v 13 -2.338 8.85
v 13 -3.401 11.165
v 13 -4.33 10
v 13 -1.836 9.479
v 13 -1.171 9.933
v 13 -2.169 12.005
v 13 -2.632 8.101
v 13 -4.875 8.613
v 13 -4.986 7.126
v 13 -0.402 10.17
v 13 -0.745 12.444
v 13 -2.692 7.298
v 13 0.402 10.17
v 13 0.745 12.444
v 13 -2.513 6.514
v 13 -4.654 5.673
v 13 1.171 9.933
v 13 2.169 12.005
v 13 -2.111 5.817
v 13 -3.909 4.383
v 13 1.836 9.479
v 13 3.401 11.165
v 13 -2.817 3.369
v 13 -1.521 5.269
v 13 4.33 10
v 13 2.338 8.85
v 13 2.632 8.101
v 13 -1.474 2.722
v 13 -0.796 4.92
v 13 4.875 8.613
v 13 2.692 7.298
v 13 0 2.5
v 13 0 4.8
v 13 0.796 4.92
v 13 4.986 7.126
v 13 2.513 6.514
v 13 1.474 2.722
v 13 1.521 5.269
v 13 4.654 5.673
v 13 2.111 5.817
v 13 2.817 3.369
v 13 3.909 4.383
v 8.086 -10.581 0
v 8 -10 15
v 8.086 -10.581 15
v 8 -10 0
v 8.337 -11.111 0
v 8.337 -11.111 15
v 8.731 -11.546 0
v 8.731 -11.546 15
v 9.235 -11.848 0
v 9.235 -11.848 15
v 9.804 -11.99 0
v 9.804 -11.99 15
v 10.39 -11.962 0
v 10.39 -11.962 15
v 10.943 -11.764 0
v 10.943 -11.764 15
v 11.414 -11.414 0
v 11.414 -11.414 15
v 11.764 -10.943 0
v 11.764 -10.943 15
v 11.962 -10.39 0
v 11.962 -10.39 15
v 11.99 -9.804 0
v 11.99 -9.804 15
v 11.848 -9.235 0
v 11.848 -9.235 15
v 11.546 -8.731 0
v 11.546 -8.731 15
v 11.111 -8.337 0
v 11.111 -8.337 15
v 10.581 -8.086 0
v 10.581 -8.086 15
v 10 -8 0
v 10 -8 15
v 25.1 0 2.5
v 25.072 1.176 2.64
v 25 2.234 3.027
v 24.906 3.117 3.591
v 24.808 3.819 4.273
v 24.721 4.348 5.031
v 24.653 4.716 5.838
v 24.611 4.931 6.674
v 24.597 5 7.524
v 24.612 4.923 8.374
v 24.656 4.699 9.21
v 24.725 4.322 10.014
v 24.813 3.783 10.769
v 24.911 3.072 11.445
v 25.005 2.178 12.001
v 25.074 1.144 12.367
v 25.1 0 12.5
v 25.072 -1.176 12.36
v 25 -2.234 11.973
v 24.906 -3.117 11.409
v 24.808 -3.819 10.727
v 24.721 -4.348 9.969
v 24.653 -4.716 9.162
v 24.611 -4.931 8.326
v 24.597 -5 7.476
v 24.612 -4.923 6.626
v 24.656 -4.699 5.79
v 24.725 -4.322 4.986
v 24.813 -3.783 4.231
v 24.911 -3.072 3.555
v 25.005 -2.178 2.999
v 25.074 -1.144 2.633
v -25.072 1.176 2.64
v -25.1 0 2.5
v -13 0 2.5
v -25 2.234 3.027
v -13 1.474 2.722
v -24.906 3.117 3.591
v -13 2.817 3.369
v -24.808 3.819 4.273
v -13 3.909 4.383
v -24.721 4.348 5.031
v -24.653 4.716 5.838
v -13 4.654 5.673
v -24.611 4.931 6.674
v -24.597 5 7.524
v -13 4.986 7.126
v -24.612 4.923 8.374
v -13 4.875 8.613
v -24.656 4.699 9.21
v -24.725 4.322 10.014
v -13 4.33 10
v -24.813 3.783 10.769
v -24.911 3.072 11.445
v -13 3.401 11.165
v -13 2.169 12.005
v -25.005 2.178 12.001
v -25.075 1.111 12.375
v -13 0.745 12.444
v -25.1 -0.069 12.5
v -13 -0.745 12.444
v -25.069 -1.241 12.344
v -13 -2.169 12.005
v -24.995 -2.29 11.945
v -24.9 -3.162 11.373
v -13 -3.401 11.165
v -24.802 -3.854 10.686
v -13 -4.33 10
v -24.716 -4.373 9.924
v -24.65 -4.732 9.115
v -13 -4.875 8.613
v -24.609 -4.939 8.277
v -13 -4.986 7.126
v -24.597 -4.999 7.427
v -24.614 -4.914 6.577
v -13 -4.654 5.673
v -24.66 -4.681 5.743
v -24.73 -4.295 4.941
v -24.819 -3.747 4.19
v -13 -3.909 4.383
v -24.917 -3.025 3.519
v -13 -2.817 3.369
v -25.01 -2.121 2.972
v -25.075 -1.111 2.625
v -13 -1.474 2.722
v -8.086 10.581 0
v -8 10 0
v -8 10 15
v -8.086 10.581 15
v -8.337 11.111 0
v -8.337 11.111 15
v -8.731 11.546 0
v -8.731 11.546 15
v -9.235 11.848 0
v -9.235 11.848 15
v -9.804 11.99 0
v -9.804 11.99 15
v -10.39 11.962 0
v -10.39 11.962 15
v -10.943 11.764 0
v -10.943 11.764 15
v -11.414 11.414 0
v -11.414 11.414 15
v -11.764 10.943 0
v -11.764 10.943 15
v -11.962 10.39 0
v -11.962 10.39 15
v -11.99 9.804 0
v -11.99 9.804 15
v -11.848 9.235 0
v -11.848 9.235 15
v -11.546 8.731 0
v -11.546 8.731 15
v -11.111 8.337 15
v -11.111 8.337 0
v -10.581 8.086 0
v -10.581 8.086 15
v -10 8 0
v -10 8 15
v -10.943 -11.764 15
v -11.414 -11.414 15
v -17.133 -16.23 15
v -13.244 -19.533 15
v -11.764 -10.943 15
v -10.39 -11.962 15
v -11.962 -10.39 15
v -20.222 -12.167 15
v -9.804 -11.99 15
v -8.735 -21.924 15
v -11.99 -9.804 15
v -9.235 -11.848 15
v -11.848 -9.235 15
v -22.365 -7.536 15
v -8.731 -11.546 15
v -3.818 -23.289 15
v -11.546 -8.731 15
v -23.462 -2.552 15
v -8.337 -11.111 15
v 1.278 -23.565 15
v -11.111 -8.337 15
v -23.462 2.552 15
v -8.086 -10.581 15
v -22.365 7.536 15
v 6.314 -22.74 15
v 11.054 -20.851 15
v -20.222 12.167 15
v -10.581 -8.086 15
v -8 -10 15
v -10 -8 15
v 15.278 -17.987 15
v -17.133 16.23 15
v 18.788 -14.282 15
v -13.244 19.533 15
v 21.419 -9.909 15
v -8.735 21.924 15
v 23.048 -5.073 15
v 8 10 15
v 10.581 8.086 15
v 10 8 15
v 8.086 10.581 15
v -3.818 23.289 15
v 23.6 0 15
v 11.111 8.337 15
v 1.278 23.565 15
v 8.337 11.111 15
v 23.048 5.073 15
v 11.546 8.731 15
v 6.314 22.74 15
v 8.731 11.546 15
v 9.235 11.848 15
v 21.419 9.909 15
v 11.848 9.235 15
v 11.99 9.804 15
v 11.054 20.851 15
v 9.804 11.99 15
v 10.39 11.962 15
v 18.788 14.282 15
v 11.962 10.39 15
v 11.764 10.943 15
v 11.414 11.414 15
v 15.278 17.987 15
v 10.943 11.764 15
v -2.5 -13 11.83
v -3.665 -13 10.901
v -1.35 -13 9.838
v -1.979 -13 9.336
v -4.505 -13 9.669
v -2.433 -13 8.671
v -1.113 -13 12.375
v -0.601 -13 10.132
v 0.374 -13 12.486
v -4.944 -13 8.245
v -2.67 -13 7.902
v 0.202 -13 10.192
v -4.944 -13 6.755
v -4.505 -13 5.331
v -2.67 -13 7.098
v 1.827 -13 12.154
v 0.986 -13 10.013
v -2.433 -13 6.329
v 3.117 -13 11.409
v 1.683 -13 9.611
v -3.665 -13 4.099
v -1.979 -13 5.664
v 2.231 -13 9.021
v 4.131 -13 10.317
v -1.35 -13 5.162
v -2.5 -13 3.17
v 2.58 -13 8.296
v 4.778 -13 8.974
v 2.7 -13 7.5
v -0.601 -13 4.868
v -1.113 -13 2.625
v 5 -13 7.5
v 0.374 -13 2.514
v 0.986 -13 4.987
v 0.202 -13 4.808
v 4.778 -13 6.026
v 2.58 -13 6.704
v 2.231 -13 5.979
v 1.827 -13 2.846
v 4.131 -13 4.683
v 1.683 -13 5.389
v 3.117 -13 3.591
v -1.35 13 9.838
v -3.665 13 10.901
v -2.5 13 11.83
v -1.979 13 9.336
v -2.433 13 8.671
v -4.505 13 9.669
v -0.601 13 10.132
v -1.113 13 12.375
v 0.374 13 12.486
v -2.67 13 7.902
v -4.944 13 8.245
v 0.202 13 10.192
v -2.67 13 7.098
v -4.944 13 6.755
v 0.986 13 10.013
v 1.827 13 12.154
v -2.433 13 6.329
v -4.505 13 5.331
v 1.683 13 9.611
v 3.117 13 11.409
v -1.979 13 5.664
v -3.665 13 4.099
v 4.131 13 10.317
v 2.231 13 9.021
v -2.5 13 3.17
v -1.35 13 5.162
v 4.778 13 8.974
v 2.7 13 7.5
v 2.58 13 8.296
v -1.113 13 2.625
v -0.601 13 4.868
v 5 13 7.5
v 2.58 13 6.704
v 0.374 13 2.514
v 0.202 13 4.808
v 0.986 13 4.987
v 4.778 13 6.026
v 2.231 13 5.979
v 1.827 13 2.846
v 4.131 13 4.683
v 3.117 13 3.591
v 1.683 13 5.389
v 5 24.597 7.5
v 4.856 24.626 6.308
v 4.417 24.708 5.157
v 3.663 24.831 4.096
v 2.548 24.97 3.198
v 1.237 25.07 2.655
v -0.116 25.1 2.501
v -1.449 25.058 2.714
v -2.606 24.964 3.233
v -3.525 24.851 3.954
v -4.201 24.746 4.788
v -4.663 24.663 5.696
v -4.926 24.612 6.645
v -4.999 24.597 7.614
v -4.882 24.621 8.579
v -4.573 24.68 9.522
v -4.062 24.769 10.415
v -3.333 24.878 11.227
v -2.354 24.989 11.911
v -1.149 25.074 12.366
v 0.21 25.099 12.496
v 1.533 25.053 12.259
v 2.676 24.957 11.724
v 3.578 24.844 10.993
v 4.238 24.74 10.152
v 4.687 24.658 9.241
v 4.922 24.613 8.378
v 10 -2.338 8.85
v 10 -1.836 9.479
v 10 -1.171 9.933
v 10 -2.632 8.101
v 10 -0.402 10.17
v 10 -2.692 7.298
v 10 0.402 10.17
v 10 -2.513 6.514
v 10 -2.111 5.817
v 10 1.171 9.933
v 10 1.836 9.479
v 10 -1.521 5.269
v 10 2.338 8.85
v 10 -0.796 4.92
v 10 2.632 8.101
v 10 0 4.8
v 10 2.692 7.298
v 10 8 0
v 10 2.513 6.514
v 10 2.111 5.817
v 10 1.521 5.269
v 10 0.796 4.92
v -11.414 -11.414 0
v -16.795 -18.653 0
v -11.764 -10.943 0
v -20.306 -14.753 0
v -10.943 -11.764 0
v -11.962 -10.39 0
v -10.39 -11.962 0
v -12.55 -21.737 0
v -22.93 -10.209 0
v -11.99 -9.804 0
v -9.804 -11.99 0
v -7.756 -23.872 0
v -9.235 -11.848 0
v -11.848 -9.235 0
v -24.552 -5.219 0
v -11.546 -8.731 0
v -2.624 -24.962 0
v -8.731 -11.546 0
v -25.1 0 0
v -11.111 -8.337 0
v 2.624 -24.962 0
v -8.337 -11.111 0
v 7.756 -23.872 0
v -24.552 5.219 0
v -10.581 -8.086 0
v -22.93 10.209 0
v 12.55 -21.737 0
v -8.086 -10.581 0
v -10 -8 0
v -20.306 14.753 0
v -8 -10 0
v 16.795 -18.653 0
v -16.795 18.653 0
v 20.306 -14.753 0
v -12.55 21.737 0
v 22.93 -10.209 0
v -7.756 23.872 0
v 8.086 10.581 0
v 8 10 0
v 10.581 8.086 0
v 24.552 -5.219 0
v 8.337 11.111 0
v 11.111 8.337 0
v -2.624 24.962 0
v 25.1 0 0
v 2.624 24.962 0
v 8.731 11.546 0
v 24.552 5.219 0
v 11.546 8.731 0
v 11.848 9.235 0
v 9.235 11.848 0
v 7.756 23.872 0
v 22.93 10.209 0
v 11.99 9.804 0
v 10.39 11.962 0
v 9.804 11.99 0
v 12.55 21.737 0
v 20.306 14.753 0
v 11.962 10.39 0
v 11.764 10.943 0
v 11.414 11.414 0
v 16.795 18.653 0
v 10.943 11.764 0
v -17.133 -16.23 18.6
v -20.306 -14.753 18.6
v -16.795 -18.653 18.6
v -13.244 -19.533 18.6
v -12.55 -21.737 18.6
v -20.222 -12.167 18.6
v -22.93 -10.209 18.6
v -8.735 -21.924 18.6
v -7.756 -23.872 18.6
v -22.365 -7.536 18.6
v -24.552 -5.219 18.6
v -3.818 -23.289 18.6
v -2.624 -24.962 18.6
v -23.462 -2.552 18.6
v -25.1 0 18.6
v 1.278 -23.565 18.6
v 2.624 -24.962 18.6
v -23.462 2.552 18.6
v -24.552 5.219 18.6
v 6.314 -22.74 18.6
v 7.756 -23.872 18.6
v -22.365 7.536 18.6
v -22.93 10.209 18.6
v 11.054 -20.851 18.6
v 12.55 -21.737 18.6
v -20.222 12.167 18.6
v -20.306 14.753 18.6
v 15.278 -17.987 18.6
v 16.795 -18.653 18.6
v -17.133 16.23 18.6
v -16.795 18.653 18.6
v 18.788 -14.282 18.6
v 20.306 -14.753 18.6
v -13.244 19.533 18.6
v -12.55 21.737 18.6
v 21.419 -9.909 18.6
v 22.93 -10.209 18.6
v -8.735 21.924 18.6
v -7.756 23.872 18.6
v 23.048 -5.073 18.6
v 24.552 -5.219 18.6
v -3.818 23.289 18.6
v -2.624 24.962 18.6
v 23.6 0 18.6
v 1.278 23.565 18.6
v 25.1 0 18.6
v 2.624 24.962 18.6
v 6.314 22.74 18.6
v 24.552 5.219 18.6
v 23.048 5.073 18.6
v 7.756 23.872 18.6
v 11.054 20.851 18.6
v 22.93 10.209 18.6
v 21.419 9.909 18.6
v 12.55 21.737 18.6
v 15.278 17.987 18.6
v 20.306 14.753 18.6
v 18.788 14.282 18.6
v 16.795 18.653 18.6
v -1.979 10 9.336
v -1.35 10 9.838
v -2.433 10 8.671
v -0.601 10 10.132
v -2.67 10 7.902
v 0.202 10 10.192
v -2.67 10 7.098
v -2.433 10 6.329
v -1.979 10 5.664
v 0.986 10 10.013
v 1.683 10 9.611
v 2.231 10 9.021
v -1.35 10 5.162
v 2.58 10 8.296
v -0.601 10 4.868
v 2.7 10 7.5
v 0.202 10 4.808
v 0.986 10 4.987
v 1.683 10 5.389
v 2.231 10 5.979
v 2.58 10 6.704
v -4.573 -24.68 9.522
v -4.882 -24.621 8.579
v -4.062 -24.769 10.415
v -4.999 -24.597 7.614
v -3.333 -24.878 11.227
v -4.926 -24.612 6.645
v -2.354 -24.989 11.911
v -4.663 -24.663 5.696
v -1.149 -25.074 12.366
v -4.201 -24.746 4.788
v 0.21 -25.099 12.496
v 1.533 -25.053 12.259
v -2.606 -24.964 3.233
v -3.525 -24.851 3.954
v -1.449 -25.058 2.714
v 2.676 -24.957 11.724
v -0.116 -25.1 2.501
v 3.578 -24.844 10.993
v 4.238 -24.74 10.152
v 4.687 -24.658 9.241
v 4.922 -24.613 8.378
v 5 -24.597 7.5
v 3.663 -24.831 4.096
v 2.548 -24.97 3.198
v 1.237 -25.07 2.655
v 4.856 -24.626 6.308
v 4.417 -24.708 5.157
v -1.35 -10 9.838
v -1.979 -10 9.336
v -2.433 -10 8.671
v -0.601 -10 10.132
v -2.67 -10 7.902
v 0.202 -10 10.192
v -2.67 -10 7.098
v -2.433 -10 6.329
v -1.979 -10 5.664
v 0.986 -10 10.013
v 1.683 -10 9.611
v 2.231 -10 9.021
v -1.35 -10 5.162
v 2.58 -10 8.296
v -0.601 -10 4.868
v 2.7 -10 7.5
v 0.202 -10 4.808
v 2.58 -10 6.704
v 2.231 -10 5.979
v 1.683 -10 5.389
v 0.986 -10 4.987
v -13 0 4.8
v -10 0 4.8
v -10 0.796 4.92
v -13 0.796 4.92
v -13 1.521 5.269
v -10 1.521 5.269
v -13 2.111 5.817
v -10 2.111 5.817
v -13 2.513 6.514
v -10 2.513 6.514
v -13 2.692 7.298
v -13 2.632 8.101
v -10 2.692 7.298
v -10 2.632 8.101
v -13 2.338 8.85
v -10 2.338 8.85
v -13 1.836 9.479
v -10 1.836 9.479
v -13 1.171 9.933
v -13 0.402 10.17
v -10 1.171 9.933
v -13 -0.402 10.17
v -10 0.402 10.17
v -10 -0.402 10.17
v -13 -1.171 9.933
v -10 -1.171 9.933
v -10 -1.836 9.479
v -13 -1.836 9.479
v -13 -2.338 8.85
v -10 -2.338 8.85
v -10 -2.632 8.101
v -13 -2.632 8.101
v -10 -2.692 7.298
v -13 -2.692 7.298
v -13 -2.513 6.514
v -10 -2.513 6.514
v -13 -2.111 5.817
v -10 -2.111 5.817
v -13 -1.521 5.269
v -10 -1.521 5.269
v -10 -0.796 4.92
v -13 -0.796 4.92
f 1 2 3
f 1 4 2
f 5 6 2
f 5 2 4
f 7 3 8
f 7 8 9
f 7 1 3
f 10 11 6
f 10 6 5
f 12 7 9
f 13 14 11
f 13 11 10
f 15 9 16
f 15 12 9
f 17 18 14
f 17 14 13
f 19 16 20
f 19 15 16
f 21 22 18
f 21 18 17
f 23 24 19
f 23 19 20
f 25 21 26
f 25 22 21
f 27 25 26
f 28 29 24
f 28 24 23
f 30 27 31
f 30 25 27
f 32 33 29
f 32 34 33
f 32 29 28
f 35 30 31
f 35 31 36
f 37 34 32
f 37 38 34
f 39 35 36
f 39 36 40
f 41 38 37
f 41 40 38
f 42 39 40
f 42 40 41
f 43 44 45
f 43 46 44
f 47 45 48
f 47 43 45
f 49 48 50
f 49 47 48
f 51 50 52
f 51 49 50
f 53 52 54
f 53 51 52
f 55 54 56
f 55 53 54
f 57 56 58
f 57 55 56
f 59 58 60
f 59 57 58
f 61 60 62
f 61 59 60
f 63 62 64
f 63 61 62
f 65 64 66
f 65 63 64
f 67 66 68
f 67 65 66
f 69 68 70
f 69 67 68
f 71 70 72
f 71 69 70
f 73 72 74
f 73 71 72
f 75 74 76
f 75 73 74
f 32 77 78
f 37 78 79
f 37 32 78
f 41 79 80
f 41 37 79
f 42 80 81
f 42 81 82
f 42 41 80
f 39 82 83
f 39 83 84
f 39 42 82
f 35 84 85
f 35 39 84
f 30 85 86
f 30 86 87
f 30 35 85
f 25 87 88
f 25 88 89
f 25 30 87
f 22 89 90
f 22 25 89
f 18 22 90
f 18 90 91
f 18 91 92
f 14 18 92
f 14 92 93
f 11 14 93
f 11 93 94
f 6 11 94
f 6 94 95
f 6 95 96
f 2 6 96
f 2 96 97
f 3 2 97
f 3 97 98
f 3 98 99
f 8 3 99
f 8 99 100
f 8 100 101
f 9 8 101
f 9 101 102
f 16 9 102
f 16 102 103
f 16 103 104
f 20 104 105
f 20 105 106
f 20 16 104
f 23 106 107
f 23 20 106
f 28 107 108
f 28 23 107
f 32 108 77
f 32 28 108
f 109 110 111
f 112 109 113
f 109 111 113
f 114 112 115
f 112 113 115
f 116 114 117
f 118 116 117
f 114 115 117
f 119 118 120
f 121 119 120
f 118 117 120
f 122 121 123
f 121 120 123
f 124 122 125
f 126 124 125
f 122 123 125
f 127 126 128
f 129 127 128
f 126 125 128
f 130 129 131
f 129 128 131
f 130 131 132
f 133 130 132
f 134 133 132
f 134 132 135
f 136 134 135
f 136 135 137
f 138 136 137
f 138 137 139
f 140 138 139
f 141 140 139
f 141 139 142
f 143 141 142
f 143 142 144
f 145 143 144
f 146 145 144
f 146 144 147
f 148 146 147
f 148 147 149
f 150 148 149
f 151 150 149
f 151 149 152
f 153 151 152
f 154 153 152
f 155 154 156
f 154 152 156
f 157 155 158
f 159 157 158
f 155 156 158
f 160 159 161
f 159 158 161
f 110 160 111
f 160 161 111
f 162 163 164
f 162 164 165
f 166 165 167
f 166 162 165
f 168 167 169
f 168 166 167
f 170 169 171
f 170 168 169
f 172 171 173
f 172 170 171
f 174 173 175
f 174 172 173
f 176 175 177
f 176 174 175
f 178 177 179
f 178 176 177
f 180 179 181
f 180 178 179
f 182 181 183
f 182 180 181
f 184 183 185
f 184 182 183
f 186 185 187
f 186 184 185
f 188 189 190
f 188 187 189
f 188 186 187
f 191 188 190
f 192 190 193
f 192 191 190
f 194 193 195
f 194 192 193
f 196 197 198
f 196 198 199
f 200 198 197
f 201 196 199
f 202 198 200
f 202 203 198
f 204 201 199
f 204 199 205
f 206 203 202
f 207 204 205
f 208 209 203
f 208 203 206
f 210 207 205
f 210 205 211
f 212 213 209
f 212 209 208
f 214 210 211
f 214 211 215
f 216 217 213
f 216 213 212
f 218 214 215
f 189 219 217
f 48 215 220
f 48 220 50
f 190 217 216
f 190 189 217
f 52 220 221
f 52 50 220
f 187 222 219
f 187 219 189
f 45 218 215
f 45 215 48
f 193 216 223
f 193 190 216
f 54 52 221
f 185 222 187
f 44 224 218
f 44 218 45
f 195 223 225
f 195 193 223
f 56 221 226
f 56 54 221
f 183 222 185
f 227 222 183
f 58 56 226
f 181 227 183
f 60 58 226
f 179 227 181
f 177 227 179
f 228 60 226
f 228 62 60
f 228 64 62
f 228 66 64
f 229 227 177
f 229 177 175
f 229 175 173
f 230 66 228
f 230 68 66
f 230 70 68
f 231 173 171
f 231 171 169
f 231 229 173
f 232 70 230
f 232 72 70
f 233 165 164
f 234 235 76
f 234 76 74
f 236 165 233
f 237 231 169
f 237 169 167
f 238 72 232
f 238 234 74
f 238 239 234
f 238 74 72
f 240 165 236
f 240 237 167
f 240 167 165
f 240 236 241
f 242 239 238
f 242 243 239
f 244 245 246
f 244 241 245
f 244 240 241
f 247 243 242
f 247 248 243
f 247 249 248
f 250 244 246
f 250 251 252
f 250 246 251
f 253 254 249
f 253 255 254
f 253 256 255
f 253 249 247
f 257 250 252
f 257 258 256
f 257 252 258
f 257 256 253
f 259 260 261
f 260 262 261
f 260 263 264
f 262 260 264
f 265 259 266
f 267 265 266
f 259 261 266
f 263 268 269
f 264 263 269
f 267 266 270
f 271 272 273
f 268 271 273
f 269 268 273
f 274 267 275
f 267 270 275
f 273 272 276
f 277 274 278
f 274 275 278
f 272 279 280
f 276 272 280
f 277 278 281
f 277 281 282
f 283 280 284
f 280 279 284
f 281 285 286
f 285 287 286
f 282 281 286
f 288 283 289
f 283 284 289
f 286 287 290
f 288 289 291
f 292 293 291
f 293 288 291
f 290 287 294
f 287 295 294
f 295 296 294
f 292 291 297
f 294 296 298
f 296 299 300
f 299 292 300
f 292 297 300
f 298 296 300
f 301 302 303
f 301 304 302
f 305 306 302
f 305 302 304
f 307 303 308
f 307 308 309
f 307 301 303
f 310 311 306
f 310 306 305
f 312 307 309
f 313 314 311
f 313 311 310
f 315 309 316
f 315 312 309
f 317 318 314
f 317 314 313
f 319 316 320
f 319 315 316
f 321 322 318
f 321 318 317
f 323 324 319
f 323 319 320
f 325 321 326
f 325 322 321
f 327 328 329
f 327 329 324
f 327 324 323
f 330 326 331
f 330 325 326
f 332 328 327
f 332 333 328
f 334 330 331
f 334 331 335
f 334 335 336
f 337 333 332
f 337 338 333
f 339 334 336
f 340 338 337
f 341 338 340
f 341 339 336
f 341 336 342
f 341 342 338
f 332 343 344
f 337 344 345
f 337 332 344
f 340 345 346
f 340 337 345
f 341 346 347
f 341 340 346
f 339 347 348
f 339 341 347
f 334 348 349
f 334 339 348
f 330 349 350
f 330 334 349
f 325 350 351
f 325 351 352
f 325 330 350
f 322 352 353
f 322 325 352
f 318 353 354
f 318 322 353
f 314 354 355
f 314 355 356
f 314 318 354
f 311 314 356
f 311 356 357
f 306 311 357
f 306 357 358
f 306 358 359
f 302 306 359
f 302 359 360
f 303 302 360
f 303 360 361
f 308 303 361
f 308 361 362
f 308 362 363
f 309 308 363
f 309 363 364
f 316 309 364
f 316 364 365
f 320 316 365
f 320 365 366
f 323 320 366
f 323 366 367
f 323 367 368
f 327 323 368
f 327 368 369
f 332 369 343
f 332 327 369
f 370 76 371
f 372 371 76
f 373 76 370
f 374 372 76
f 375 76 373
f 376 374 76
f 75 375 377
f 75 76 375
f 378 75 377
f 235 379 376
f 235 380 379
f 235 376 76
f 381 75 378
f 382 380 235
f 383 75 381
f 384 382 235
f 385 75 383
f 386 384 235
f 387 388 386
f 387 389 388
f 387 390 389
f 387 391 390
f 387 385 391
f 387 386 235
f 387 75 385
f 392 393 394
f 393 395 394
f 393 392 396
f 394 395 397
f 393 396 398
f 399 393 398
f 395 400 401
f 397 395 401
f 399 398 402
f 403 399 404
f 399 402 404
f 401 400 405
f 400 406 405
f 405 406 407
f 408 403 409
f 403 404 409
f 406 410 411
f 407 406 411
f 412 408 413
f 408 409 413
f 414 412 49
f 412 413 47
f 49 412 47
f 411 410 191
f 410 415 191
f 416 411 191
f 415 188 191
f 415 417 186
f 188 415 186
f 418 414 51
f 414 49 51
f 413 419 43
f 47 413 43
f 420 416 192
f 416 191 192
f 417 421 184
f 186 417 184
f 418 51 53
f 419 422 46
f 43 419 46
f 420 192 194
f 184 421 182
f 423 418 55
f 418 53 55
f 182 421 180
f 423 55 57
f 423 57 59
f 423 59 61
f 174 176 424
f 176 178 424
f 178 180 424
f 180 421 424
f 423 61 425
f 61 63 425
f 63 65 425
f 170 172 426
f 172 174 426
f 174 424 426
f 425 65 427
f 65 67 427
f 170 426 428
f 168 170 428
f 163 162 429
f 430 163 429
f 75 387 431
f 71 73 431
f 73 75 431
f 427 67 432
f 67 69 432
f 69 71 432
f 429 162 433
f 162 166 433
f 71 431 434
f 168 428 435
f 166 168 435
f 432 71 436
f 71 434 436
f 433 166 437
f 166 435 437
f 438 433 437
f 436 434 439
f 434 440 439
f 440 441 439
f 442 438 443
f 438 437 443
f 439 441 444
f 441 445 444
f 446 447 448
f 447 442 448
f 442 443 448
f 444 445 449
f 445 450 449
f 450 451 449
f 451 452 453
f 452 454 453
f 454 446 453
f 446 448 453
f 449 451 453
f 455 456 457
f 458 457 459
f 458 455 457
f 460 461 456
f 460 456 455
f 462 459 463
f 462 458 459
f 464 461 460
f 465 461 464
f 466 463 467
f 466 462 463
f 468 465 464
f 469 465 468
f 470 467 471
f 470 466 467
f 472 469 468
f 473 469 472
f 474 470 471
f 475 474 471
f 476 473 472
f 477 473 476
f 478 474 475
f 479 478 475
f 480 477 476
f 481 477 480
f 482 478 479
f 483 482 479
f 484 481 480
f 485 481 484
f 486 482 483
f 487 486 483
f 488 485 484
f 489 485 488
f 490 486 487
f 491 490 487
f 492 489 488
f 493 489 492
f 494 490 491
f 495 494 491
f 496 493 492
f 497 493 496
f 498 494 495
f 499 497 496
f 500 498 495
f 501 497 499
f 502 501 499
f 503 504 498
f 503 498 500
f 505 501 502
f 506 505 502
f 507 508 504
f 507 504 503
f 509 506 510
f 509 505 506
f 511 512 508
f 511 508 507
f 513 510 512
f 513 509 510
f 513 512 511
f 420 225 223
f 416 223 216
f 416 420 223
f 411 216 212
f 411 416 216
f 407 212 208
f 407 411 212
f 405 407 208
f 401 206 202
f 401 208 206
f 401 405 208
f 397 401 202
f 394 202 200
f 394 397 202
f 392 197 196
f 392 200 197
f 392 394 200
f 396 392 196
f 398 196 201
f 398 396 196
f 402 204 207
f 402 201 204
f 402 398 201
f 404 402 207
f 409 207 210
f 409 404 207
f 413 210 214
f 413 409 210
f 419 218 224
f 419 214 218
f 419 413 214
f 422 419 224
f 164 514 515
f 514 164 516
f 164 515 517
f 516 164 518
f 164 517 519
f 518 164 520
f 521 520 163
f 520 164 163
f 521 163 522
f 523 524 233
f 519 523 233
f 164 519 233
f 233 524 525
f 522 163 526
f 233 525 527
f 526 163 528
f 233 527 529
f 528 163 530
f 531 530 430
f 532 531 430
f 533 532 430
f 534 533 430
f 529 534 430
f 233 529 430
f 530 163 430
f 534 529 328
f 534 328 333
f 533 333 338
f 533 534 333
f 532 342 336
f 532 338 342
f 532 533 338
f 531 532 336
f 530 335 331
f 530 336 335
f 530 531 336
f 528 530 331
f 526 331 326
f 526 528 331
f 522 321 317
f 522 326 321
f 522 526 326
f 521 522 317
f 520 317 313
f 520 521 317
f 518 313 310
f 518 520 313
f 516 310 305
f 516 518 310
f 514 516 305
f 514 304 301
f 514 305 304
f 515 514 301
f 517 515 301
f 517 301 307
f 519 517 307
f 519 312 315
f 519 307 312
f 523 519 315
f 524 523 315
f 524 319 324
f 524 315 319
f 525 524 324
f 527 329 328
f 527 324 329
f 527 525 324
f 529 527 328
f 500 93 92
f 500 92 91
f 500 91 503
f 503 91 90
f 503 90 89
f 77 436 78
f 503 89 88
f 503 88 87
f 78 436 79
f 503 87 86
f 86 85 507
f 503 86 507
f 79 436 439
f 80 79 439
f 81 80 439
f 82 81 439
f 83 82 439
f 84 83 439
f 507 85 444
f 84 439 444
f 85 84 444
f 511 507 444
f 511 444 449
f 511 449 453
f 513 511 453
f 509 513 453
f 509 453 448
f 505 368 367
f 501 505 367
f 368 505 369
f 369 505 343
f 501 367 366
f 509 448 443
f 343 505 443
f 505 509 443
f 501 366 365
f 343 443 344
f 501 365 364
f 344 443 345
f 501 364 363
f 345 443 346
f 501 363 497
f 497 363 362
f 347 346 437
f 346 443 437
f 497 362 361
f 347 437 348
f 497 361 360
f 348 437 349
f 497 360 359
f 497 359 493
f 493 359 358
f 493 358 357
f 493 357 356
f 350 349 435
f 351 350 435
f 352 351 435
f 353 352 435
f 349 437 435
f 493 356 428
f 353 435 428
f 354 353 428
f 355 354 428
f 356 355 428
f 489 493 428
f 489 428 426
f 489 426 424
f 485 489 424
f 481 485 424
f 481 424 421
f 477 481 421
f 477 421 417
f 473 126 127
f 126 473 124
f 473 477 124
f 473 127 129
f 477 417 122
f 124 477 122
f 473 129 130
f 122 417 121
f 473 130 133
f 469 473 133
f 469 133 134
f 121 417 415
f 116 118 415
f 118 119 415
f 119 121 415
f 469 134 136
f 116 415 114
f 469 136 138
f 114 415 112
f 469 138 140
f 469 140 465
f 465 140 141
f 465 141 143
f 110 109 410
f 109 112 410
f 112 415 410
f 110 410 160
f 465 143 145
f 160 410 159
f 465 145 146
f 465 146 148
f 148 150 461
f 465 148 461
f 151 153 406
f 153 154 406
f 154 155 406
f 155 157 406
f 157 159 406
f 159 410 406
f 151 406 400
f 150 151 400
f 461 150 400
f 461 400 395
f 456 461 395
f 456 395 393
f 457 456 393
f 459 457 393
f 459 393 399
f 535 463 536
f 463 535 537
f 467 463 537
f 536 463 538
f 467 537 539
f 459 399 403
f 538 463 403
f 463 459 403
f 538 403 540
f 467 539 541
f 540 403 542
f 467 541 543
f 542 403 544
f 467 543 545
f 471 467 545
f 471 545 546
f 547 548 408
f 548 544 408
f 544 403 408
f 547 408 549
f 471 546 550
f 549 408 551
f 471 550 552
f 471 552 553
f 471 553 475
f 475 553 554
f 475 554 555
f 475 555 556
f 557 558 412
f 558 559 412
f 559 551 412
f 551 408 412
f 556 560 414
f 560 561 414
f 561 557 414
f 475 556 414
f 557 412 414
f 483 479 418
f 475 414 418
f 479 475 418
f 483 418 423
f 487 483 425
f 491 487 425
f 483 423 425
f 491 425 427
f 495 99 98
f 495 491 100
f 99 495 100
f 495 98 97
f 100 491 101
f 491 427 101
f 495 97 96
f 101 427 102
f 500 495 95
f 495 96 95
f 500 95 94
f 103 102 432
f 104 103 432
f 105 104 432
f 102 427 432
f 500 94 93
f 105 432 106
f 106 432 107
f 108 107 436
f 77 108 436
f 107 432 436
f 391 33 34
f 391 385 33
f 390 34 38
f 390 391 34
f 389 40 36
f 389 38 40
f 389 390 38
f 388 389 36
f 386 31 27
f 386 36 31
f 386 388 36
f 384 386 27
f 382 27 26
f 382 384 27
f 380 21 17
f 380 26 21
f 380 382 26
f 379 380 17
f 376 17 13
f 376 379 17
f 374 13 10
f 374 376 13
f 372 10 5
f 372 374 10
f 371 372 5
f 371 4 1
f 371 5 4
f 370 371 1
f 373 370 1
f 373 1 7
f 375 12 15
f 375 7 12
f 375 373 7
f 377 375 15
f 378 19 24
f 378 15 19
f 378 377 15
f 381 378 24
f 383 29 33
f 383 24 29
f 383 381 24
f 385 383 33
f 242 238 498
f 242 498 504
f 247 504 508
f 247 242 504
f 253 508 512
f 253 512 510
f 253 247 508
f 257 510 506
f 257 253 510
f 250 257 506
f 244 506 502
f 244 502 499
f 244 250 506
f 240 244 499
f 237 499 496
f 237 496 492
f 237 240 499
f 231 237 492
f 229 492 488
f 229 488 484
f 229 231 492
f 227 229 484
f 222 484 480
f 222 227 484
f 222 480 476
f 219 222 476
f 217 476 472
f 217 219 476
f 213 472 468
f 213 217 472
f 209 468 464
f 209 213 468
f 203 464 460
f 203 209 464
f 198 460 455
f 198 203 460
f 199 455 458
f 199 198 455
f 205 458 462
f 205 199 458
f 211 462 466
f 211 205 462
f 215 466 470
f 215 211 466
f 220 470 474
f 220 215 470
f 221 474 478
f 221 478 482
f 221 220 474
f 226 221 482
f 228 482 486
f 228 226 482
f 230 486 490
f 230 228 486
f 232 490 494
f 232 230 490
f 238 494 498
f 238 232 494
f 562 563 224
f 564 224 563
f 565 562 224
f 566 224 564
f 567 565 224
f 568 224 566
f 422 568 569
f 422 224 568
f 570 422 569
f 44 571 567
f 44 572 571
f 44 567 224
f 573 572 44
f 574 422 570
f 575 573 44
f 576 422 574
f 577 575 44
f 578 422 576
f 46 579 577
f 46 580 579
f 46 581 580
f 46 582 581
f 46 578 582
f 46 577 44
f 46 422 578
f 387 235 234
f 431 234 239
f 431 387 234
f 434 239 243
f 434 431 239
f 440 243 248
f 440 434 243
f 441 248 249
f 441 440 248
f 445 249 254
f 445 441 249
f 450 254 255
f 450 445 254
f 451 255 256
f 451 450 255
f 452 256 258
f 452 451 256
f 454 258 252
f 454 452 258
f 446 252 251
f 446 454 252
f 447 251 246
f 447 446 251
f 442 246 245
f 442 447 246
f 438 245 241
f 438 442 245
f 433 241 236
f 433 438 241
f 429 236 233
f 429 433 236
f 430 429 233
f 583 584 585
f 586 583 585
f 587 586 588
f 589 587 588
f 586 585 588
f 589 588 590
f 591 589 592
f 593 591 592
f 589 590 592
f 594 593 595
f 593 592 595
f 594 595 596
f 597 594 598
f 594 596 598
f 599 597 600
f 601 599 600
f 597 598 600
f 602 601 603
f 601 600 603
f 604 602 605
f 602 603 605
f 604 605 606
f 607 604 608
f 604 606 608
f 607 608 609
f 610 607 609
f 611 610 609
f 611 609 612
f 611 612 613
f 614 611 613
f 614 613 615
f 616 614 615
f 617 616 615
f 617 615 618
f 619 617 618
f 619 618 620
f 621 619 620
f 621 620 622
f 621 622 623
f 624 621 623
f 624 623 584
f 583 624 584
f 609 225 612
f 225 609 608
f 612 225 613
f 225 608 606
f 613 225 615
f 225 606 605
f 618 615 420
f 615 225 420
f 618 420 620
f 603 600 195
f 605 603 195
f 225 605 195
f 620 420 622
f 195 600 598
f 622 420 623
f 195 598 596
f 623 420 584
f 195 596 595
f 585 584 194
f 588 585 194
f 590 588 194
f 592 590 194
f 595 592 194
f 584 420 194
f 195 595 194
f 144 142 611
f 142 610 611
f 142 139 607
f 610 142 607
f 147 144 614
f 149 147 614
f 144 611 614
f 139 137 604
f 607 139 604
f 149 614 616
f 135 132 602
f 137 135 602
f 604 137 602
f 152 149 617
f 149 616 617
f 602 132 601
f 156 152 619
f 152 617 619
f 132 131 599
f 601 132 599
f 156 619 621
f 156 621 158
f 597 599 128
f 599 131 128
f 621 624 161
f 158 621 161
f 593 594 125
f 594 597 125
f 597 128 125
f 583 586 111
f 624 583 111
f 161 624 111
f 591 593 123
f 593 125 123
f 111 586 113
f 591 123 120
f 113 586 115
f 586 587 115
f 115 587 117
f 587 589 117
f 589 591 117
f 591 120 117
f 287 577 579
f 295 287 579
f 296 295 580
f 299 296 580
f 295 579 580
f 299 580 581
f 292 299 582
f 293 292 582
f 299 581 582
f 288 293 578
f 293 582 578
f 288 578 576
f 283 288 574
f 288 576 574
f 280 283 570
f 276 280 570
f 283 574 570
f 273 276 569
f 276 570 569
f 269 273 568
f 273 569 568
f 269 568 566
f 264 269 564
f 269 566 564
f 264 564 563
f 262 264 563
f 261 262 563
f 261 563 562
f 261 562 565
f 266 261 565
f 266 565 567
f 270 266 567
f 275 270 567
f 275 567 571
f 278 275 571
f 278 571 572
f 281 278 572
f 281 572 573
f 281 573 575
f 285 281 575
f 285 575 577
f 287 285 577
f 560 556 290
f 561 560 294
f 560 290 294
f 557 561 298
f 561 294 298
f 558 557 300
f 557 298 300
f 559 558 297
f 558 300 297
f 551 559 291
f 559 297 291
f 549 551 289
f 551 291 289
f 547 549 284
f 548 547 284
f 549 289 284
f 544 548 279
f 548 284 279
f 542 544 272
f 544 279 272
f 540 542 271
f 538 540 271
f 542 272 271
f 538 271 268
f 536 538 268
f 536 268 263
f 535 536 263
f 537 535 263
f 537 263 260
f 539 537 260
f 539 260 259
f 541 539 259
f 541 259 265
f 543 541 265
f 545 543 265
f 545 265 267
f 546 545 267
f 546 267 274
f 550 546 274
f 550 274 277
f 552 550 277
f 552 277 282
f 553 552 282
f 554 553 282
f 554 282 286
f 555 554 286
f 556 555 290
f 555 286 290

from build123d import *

# Parameters (mm, degrees)
SKIZZE1_R                            = 25.1
SKIZZE1_W                            = 20
SKIZZE1_H                            = 20
AUFSATZ_LINEAR_AUSTRAGEN1_DEPTH      = 15
SKIZZE2_R                            = 25.1
SKIZZE2_R_2                          = 23.6
AUFSATZ_LINEAR_AUSTRAGEN2_DEPTH      = 3.6
SKIZZE3_R                            = 2
SCHNITT_LINEAR_AUSTRAGEN2_DEPTH      = 19.6
SKIZZE4_R                            = 2.7
SCHNITT_LINEAR_AUSTRAGEN3_DEPTH      = 26.1
SCHNITT_LINEAR_AUSTRAGEN3_DEPTH_BACK = 26.1
SKIZZE5_R                            = 2.7
SCHNITT_LINEAR_AUSTRAGEN4_DEPTH      = 26.1000001
SCHNITT_LINEAR_AUSTRAGEN4_DEPTH_BACK = 26.1000001
SCHNITT_LINEAR_START                 = 13
SKIZZE4_3_R                          = 5
SCHNITT_LINEAR_AUSTRAGEN5_DEPTH      = 13.1000001
SKIZZE5_3_R                          = 5
SCHNITT_LINEAR_AUSTRAGEN6_DEPTH      = 13.1000001


with BuildPart() as part:
    # Skizze1 → Aufsatz-Linear austragen1 (new body)
    with BuildSketch(Plane.XY):
        Circle(SKIZZE1_R)
        Rectangle(SKIZZE1_W, SKIZZE1_H, mode=Mode.SUBTRACT)
    extrude(amount=AUFSATZ_LINEAR_AUSTRAGEN1_DEPTH)

    # Skizze2 → Aufsatz-Linear austragen2 (add)
    with BuildSketch(Plane.XY.offset(15)):
        Circle(SKIZZE2_R)
        Circle(SKIZZE2_R_2, mode=Mode.SUBTRACT)
    extrude(amount=AUFSATZ_LINEAR_AUSTRAGEN2_DEPTH)

    # Skizze3 → Schnitt-Linear austragen2 (cut, through all)
    with BuildSketch(Plane.XY):
        with Locations((-10, 10)):
            Circle(SKIZZE3_R)
        with Locations((10, 10)):
            Circle(SKIZZE3_R)
        with Locations((10, -10)):
            Circle(SKIZZE3_R)
        with Locations((-10, -10)):
            Circle(SKIZZE3_R)
    extrude(amount=SCHNITT_LINEAR_AUSTRAGEN2_DEPTH, mode=Mode.SUBTRACT)

    # Skizze4 → Schnitt-Linear austragen3 (cut, two sides)
    with BuildSketch(Plane(origin=(0, 0, 0), x_dir=(1, 0, 0), z_dir=(0, 1, 0))) as schnitt_linear_austragen3_sk:
        with Locations((0, -7.5)):
            Circle(SKIZZE4_R)
    extrude(amount=SCHNITT_LINEAR_AUSTRAGEN3_DEPTH, mode=Mode.SUBTRACT)
    extrude(schnitt_linear_austragen3_sk.sketch, amount=-SCHNITT_LINEAR_AUSTRAGEN3_DEPTH_BACK, mode=Mode.SUBTRACT)

    # Skizze5 → Schnitt-Linear austragen4 (cut, two sides)
    with BuildSketch(Plane(origin=(0, 0, 0), x_dir=(0, 0, -1), z_dir=(1, 0, 0))) as schnitt_linear_austragen4_sk:
        with Locations((-7.5, 0)):
            Circle(SKIZZE5_R)
    extrude(amount=SCHNITT_LINEAR_AUSTRAGEN4_DEPTH, mode=Mode.SUBTRACT)
    extrude(schnitt_linear_austragen4_sk.sketch, amount=-SCHNITT_LINEAR_AUSTRAGEN4_DEPTH_BACK, mode=Mode.SUBTRACT)

    # Skizze4<3> → Schnitt-Linear austragen5 (cut, through all)
    with BuildSketch(Plane(origin=(0, 0, 0), x_dir=(1, 0, 0), z_dir=(0, 1, 0)).offset(SCHNITT_LINEAR_START)):
        with Locations((0, -7.5)):
            Circle(SKIZZE4_3_R)
    schnitt_linear_austragen5 = extrude(amount=SCHNITT_LINEAR_AUSTRAGEN5_DEPTH, mode=Mode.SUBTRACT)

    # Spiegeln1: Schnitt-Linear austragen5 across plane
    add(schnitt_linear_austragen5.mirror(Plane.ZX), mode=Mode.SUBTRACT)

    # Skizze5<3> → Schnitt-Linear austragen6 (cut, through all)
    with BuildSketch(Plane(origin=(0, 0, 0), x_dir=(0, 0, -1), z_dir=(1, 0, 0)).offset(SCHNITT_LINEAR_START)):
        with Locations((-7.5, 0)):
            Circle(SKIZZE5_3_R)
    schnitt_linear_austragen6 = extrude(amount=SCHNITT_LINEAR_AUSTRAGEN6_DEPTH, mode=Mode.SUBTRACT)

    # Spiegeln2: Schnitt-Linear austragen6 across plane
    add(schnitt_linear_austragen6.mirror(Plane(origin=(0, 0, 0), x_dir=(0, 0, 1), z_dir=(1, 0, 0))), mode=Mode.SUBTRACT)


solid = part.part
